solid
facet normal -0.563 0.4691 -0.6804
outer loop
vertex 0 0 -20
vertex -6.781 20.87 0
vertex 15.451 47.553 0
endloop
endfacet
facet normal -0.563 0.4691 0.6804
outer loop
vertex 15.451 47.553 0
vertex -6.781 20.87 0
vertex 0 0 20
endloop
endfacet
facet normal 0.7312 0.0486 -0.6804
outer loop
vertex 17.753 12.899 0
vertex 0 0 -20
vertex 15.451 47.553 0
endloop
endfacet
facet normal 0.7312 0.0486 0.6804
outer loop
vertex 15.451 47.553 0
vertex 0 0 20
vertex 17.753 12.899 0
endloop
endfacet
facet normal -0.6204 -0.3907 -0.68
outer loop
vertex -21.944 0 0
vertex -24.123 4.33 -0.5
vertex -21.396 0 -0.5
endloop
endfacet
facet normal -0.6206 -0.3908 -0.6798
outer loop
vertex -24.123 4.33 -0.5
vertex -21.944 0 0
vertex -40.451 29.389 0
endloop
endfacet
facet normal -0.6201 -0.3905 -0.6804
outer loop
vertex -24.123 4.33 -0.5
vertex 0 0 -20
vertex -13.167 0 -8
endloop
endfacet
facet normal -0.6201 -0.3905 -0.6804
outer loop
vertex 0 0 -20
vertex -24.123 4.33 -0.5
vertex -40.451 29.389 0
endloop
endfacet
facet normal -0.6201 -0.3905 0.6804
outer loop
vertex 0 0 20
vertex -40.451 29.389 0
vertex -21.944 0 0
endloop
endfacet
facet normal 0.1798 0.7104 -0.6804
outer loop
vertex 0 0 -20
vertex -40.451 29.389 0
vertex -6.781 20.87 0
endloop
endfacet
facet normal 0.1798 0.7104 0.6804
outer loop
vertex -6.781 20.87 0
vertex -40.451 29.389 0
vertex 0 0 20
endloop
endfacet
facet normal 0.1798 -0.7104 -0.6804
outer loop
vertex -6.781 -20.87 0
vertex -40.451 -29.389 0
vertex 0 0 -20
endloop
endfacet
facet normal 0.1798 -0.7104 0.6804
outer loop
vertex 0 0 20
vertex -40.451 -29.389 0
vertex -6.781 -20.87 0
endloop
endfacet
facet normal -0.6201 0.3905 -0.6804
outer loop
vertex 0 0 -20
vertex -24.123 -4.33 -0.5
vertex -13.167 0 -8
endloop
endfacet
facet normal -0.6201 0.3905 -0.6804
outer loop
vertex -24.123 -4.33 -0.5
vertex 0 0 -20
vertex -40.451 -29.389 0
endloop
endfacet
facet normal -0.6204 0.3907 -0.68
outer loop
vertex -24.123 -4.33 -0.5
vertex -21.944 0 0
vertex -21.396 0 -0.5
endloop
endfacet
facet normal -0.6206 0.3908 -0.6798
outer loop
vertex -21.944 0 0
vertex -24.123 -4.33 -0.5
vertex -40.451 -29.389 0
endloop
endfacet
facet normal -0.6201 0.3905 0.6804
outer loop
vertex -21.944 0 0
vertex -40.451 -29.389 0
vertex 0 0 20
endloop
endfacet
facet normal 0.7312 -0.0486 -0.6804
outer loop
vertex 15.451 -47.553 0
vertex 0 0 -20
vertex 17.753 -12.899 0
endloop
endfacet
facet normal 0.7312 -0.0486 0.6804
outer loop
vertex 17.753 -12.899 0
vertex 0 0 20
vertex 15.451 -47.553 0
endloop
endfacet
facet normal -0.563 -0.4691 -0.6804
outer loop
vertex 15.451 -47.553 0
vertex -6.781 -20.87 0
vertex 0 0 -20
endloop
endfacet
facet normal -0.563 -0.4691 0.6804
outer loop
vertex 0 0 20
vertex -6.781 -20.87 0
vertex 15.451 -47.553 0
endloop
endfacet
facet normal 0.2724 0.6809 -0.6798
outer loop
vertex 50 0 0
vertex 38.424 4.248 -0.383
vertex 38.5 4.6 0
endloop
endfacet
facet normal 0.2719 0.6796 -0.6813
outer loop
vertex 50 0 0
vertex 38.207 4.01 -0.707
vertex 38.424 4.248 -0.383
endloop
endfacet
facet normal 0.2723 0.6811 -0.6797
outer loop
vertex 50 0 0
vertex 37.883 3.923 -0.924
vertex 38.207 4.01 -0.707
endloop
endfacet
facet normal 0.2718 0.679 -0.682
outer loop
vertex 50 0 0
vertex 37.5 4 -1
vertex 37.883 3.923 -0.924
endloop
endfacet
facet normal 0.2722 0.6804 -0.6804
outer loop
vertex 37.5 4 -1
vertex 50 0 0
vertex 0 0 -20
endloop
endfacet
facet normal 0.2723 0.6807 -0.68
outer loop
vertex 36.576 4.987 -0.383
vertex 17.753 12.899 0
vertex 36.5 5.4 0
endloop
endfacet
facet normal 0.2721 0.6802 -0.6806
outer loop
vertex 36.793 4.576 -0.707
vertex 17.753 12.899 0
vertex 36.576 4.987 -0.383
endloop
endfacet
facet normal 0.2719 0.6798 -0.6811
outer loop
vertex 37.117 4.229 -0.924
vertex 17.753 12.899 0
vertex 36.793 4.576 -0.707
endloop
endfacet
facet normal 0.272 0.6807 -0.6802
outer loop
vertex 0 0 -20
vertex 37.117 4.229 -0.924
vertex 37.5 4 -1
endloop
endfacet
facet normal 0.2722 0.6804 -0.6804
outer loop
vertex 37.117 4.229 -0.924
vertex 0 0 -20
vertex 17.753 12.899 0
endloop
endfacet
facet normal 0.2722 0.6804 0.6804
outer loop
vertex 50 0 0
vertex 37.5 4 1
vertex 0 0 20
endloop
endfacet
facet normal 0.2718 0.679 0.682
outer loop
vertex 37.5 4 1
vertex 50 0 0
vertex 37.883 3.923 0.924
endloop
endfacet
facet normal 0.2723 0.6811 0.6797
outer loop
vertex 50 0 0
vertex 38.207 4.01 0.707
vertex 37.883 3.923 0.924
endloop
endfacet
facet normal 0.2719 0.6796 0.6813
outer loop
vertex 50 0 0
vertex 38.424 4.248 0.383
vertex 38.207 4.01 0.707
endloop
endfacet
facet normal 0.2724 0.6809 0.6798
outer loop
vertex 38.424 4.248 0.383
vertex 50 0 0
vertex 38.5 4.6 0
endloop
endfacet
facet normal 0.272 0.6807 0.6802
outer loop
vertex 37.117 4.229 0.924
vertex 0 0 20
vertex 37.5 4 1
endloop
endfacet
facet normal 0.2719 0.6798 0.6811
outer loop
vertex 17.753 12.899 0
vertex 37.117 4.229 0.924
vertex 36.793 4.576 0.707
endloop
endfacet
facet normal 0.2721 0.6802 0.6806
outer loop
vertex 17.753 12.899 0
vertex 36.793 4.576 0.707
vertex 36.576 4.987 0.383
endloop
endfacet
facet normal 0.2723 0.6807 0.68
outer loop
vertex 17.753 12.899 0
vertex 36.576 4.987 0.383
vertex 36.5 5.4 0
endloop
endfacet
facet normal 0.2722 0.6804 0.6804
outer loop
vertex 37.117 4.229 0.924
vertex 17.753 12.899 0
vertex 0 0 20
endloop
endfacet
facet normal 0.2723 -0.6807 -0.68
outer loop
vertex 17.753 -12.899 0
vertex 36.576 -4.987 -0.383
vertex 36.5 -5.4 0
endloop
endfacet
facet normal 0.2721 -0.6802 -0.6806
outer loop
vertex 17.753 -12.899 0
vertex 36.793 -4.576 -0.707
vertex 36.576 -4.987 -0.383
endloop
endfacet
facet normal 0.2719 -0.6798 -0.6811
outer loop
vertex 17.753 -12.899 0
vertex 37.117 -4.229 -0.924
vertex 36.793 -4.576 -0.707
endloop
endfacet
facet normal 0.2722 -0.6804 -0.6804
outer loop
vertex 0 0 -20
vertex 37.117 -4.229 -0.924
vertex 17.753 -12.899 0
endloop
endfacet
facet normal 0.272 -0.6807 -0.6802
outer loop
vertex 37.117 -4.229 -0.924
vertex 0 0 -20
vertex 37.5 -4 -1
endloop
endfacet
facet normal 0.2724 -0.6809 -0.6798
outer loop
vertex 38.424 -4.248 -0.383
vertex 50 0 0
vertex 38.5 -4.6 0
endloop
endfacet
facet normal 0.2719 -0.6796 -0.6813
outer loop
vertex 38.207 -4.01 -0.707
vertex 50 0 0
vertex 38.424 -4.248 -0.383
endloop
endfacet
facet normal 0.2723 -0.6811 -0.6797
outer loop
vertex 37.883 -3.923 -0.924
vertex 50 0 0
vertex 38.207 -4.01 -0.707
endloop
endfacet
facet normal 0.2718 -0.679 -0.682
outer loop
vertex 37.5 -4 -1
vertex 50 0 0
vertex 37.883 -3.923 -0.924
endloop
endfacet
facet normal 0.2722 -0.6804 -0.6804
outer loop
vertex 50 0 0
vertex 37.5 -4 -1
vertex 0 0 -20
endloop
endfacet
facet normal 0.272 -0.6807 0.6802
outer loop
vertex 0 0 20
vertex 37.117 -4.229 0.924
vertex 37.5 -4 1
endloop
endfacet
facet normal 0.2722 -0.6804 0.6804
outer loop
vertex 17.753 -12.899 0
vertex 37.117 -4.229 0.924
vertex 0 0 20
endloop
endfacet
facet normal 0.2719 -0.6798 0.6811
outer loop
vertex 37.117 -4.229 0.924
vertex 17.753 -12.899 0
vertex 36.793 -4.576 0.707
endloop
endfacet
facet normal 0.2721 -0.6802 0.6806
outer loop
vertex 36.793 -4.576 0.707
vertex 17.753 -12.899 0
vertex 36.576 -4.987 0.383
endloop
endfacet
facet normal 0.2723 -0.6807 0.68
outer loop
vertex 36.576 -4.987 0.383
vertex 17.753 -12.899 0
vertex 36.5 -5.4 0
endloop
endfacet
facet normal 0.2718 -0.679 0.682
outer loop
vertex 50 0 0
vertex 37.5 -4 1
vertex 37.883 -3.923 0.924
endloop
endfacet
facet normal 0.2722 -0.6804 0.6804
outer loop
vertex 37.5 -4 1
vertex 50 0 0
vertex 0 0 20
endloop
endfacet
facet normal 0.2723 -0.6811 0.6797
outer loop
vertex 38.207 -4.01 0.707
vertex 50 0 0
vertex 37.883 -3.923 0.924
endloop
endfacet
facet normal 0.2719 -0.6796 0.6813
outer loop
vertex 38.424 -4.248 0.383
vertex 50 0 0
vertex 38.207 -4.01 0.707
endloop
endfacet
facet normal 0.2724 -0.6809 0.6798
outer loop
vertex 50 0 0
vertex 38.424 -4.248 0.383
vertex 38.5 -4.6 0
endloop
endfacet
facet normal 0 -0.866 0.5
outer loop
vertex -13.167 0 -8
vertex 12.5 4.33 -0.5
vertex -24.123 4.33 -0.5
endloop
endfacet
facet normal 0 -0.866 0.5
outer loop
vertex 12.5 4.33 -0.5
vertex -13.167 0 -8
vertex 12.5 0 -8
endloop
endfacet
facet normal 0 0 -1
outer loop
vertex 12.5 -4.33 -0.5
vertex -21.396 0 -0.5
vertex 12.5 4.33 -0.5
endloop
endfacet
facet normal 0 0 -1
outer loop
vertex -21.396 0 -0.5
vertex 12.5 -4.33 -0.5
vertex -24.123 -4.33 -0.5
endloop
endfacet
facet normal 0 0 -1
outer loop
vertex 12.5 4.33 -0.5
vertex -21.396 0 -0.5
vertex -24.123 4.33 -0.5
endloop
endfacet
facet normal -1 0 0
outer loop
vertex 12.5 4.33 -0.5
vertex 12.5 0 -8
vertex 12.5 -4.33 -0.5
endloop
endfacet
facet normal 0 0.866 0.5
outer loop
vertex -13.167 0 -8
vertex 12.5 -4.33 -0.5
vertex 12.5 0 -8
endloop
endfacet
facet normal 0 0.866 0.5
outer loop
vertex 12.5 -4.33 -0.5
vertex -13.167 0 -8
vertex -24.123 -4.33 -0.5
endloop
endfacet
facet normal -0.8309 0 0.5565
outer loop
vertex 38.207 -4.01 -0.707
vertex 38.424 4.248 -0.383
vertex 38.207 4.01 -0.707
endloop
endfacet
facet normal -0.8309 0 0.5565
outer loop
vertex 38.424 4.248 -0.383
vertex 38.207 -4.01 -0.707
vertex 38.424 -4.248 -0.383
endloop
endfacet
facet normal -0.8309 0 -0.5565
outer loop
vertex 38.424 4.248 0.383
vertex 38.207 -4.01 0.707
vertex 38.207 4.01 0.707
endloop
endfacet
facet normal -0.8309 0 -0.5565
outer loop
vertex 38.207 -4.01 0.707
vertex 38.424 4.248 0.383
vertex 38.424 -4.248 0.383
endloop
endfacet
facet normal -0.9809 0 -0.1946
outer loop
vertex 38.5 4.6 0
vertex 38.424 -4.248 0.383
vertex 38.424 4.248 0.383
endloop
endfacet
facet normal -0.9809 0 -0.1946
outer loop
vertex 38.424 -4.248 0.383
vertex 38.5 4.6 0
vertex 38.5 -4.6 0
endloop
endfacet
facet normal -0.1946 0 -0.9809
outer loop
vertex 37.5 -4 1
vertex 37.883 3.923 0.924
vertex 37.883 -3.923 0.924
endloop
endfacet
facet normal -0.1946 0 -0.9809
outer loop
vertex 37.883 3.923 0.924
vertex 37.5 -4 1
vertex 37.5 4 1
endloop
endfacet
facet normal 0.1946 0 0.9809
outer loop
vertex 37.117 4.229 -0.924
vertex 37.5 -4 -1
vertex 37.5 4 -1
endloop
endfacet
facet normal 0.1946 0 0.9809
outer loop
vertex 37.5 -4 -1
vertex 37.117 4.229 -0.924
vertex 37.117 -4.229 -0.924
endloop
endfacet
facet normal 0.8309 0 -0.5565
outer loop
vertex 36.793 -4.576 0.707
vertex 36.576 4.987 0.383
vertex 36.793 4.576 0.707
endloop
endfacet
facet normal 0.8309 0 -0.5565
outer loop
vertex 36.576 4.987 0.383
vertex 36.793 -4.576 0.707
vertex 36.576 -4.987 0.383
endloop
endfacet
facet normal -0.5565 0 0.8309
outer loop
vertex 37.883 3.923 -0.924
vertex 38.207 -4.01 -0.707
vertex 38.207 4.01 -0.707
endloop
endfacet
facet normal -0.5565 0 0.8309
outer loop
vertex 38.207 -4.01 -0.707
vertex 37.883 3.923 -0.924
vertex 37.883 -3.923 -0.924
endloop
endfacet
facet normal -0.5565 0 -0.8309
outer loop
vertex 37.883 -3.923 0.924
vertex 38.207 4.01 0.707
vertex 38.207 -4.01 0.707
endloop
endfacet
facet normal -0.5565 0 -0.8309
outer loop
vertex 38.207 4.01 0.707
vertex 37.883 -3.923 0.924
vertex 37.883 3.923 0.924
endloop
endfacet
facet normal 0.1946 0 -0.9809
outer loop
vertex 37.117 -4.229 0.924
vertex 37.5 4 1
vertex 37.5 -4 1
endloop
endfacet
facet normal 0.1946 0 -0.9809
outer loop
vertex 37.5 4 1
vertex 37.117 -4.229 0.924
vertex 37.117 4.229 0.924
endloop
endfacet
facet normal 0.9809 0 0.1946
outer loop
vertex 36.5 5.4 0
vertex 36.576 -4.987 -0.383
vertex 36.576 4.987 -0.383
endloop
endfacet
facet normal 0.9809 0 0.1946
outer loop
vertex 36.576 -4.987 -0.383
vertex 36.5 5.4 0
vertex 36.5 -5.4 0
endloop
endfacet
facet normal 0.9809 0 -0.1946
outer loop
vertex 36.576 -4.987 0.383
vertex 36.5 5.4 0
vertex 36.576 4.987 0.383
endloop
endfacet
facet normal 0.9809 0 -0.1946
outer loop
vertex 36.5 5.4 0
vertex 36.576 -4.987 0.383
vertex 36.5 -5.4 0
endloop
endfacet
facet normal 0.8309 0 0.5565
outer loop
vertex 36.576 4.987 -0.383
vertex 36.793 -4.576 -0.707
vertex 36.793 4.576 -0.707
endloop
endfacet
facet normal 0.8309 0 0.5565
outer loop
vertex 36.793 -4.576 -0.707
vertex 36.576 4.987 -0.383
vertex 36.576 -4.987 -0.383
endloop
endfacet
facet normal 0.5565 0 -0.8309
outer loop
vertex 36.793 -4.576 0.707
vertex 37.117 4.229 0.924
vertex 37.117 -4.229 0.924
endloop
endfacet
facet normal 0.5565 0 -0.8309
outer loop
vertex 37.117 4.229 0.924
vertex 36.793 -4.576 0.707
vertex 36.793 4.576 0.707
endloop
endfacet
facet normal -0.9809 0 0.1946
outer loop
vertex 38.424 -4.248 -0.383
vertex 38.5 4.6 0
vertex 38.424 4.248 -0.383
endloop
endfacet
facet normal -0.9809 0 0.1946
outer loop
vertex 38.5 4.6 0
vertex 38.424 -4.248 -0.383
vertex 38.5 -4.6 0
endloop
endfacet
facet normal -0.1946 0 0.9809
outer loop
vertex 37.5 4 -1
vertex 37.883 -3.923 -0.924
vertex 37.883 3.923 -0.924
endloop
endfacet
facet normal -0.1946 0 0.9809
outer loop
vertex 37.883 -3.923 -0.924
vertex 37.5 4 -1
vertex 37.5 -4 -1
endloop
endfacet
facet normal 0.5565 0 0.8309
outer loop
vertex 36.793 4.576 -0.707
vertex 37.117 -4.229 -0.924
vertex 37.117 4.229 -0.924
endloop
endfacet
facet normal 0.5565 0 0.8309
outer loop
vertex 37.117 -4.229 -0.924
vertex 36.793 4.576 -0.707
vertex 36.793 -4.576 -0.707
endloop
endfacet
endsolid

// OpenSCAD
//StarMaker
//by Alex Tanchoco (LionAlex)
//December 9, 2013
//Originally designed for making Christmas tree ornaments but can be adopted for making all kinds of stars


star_points = 5;
star_thickness = 0;
point_length = 50;
point_width = 20;
point_thickness = 5;
point_points = 4;
post_diameter = 10;
post_sides = 3;
each_angle = 180/point_points;
mounting_post = true;
thread_hole = true;


difference() {
	intersection() {
		star();
		if( star_thickness>0 )
		cube( [point_length*3,point_length*3,star_thickness], center=true );
	}
	//mounting post
	if( mounting_post )
		translate( [-point_length*0.25,0,-post_diameter/2+2] )
			rotate( [0,90,0] )
				cylinder( h=point_length,r=post_diameter/2,$fn=post_sides, center = true );

	//thread hole
	if( thread_hole )
		translate( [point_length*0.75,0,0] )
			rotate( [90,0,0] )
				cylinder( h=point_length,r=1,$fn=16, center = true );	
}

module star(star_scale=1) {
	scale( [star_scale,star_scale,star_scale] )
	for( i=[1:1:star_points] ) {
		rotate( [0,0,360/star_points * i] )
			translate( [point_length/2,0,0] )
				rotate( [0,90,0] )
				cylinder( h=point_length, r1=point_width, r2=0, $fn = point_points, center=true );
	}
}
